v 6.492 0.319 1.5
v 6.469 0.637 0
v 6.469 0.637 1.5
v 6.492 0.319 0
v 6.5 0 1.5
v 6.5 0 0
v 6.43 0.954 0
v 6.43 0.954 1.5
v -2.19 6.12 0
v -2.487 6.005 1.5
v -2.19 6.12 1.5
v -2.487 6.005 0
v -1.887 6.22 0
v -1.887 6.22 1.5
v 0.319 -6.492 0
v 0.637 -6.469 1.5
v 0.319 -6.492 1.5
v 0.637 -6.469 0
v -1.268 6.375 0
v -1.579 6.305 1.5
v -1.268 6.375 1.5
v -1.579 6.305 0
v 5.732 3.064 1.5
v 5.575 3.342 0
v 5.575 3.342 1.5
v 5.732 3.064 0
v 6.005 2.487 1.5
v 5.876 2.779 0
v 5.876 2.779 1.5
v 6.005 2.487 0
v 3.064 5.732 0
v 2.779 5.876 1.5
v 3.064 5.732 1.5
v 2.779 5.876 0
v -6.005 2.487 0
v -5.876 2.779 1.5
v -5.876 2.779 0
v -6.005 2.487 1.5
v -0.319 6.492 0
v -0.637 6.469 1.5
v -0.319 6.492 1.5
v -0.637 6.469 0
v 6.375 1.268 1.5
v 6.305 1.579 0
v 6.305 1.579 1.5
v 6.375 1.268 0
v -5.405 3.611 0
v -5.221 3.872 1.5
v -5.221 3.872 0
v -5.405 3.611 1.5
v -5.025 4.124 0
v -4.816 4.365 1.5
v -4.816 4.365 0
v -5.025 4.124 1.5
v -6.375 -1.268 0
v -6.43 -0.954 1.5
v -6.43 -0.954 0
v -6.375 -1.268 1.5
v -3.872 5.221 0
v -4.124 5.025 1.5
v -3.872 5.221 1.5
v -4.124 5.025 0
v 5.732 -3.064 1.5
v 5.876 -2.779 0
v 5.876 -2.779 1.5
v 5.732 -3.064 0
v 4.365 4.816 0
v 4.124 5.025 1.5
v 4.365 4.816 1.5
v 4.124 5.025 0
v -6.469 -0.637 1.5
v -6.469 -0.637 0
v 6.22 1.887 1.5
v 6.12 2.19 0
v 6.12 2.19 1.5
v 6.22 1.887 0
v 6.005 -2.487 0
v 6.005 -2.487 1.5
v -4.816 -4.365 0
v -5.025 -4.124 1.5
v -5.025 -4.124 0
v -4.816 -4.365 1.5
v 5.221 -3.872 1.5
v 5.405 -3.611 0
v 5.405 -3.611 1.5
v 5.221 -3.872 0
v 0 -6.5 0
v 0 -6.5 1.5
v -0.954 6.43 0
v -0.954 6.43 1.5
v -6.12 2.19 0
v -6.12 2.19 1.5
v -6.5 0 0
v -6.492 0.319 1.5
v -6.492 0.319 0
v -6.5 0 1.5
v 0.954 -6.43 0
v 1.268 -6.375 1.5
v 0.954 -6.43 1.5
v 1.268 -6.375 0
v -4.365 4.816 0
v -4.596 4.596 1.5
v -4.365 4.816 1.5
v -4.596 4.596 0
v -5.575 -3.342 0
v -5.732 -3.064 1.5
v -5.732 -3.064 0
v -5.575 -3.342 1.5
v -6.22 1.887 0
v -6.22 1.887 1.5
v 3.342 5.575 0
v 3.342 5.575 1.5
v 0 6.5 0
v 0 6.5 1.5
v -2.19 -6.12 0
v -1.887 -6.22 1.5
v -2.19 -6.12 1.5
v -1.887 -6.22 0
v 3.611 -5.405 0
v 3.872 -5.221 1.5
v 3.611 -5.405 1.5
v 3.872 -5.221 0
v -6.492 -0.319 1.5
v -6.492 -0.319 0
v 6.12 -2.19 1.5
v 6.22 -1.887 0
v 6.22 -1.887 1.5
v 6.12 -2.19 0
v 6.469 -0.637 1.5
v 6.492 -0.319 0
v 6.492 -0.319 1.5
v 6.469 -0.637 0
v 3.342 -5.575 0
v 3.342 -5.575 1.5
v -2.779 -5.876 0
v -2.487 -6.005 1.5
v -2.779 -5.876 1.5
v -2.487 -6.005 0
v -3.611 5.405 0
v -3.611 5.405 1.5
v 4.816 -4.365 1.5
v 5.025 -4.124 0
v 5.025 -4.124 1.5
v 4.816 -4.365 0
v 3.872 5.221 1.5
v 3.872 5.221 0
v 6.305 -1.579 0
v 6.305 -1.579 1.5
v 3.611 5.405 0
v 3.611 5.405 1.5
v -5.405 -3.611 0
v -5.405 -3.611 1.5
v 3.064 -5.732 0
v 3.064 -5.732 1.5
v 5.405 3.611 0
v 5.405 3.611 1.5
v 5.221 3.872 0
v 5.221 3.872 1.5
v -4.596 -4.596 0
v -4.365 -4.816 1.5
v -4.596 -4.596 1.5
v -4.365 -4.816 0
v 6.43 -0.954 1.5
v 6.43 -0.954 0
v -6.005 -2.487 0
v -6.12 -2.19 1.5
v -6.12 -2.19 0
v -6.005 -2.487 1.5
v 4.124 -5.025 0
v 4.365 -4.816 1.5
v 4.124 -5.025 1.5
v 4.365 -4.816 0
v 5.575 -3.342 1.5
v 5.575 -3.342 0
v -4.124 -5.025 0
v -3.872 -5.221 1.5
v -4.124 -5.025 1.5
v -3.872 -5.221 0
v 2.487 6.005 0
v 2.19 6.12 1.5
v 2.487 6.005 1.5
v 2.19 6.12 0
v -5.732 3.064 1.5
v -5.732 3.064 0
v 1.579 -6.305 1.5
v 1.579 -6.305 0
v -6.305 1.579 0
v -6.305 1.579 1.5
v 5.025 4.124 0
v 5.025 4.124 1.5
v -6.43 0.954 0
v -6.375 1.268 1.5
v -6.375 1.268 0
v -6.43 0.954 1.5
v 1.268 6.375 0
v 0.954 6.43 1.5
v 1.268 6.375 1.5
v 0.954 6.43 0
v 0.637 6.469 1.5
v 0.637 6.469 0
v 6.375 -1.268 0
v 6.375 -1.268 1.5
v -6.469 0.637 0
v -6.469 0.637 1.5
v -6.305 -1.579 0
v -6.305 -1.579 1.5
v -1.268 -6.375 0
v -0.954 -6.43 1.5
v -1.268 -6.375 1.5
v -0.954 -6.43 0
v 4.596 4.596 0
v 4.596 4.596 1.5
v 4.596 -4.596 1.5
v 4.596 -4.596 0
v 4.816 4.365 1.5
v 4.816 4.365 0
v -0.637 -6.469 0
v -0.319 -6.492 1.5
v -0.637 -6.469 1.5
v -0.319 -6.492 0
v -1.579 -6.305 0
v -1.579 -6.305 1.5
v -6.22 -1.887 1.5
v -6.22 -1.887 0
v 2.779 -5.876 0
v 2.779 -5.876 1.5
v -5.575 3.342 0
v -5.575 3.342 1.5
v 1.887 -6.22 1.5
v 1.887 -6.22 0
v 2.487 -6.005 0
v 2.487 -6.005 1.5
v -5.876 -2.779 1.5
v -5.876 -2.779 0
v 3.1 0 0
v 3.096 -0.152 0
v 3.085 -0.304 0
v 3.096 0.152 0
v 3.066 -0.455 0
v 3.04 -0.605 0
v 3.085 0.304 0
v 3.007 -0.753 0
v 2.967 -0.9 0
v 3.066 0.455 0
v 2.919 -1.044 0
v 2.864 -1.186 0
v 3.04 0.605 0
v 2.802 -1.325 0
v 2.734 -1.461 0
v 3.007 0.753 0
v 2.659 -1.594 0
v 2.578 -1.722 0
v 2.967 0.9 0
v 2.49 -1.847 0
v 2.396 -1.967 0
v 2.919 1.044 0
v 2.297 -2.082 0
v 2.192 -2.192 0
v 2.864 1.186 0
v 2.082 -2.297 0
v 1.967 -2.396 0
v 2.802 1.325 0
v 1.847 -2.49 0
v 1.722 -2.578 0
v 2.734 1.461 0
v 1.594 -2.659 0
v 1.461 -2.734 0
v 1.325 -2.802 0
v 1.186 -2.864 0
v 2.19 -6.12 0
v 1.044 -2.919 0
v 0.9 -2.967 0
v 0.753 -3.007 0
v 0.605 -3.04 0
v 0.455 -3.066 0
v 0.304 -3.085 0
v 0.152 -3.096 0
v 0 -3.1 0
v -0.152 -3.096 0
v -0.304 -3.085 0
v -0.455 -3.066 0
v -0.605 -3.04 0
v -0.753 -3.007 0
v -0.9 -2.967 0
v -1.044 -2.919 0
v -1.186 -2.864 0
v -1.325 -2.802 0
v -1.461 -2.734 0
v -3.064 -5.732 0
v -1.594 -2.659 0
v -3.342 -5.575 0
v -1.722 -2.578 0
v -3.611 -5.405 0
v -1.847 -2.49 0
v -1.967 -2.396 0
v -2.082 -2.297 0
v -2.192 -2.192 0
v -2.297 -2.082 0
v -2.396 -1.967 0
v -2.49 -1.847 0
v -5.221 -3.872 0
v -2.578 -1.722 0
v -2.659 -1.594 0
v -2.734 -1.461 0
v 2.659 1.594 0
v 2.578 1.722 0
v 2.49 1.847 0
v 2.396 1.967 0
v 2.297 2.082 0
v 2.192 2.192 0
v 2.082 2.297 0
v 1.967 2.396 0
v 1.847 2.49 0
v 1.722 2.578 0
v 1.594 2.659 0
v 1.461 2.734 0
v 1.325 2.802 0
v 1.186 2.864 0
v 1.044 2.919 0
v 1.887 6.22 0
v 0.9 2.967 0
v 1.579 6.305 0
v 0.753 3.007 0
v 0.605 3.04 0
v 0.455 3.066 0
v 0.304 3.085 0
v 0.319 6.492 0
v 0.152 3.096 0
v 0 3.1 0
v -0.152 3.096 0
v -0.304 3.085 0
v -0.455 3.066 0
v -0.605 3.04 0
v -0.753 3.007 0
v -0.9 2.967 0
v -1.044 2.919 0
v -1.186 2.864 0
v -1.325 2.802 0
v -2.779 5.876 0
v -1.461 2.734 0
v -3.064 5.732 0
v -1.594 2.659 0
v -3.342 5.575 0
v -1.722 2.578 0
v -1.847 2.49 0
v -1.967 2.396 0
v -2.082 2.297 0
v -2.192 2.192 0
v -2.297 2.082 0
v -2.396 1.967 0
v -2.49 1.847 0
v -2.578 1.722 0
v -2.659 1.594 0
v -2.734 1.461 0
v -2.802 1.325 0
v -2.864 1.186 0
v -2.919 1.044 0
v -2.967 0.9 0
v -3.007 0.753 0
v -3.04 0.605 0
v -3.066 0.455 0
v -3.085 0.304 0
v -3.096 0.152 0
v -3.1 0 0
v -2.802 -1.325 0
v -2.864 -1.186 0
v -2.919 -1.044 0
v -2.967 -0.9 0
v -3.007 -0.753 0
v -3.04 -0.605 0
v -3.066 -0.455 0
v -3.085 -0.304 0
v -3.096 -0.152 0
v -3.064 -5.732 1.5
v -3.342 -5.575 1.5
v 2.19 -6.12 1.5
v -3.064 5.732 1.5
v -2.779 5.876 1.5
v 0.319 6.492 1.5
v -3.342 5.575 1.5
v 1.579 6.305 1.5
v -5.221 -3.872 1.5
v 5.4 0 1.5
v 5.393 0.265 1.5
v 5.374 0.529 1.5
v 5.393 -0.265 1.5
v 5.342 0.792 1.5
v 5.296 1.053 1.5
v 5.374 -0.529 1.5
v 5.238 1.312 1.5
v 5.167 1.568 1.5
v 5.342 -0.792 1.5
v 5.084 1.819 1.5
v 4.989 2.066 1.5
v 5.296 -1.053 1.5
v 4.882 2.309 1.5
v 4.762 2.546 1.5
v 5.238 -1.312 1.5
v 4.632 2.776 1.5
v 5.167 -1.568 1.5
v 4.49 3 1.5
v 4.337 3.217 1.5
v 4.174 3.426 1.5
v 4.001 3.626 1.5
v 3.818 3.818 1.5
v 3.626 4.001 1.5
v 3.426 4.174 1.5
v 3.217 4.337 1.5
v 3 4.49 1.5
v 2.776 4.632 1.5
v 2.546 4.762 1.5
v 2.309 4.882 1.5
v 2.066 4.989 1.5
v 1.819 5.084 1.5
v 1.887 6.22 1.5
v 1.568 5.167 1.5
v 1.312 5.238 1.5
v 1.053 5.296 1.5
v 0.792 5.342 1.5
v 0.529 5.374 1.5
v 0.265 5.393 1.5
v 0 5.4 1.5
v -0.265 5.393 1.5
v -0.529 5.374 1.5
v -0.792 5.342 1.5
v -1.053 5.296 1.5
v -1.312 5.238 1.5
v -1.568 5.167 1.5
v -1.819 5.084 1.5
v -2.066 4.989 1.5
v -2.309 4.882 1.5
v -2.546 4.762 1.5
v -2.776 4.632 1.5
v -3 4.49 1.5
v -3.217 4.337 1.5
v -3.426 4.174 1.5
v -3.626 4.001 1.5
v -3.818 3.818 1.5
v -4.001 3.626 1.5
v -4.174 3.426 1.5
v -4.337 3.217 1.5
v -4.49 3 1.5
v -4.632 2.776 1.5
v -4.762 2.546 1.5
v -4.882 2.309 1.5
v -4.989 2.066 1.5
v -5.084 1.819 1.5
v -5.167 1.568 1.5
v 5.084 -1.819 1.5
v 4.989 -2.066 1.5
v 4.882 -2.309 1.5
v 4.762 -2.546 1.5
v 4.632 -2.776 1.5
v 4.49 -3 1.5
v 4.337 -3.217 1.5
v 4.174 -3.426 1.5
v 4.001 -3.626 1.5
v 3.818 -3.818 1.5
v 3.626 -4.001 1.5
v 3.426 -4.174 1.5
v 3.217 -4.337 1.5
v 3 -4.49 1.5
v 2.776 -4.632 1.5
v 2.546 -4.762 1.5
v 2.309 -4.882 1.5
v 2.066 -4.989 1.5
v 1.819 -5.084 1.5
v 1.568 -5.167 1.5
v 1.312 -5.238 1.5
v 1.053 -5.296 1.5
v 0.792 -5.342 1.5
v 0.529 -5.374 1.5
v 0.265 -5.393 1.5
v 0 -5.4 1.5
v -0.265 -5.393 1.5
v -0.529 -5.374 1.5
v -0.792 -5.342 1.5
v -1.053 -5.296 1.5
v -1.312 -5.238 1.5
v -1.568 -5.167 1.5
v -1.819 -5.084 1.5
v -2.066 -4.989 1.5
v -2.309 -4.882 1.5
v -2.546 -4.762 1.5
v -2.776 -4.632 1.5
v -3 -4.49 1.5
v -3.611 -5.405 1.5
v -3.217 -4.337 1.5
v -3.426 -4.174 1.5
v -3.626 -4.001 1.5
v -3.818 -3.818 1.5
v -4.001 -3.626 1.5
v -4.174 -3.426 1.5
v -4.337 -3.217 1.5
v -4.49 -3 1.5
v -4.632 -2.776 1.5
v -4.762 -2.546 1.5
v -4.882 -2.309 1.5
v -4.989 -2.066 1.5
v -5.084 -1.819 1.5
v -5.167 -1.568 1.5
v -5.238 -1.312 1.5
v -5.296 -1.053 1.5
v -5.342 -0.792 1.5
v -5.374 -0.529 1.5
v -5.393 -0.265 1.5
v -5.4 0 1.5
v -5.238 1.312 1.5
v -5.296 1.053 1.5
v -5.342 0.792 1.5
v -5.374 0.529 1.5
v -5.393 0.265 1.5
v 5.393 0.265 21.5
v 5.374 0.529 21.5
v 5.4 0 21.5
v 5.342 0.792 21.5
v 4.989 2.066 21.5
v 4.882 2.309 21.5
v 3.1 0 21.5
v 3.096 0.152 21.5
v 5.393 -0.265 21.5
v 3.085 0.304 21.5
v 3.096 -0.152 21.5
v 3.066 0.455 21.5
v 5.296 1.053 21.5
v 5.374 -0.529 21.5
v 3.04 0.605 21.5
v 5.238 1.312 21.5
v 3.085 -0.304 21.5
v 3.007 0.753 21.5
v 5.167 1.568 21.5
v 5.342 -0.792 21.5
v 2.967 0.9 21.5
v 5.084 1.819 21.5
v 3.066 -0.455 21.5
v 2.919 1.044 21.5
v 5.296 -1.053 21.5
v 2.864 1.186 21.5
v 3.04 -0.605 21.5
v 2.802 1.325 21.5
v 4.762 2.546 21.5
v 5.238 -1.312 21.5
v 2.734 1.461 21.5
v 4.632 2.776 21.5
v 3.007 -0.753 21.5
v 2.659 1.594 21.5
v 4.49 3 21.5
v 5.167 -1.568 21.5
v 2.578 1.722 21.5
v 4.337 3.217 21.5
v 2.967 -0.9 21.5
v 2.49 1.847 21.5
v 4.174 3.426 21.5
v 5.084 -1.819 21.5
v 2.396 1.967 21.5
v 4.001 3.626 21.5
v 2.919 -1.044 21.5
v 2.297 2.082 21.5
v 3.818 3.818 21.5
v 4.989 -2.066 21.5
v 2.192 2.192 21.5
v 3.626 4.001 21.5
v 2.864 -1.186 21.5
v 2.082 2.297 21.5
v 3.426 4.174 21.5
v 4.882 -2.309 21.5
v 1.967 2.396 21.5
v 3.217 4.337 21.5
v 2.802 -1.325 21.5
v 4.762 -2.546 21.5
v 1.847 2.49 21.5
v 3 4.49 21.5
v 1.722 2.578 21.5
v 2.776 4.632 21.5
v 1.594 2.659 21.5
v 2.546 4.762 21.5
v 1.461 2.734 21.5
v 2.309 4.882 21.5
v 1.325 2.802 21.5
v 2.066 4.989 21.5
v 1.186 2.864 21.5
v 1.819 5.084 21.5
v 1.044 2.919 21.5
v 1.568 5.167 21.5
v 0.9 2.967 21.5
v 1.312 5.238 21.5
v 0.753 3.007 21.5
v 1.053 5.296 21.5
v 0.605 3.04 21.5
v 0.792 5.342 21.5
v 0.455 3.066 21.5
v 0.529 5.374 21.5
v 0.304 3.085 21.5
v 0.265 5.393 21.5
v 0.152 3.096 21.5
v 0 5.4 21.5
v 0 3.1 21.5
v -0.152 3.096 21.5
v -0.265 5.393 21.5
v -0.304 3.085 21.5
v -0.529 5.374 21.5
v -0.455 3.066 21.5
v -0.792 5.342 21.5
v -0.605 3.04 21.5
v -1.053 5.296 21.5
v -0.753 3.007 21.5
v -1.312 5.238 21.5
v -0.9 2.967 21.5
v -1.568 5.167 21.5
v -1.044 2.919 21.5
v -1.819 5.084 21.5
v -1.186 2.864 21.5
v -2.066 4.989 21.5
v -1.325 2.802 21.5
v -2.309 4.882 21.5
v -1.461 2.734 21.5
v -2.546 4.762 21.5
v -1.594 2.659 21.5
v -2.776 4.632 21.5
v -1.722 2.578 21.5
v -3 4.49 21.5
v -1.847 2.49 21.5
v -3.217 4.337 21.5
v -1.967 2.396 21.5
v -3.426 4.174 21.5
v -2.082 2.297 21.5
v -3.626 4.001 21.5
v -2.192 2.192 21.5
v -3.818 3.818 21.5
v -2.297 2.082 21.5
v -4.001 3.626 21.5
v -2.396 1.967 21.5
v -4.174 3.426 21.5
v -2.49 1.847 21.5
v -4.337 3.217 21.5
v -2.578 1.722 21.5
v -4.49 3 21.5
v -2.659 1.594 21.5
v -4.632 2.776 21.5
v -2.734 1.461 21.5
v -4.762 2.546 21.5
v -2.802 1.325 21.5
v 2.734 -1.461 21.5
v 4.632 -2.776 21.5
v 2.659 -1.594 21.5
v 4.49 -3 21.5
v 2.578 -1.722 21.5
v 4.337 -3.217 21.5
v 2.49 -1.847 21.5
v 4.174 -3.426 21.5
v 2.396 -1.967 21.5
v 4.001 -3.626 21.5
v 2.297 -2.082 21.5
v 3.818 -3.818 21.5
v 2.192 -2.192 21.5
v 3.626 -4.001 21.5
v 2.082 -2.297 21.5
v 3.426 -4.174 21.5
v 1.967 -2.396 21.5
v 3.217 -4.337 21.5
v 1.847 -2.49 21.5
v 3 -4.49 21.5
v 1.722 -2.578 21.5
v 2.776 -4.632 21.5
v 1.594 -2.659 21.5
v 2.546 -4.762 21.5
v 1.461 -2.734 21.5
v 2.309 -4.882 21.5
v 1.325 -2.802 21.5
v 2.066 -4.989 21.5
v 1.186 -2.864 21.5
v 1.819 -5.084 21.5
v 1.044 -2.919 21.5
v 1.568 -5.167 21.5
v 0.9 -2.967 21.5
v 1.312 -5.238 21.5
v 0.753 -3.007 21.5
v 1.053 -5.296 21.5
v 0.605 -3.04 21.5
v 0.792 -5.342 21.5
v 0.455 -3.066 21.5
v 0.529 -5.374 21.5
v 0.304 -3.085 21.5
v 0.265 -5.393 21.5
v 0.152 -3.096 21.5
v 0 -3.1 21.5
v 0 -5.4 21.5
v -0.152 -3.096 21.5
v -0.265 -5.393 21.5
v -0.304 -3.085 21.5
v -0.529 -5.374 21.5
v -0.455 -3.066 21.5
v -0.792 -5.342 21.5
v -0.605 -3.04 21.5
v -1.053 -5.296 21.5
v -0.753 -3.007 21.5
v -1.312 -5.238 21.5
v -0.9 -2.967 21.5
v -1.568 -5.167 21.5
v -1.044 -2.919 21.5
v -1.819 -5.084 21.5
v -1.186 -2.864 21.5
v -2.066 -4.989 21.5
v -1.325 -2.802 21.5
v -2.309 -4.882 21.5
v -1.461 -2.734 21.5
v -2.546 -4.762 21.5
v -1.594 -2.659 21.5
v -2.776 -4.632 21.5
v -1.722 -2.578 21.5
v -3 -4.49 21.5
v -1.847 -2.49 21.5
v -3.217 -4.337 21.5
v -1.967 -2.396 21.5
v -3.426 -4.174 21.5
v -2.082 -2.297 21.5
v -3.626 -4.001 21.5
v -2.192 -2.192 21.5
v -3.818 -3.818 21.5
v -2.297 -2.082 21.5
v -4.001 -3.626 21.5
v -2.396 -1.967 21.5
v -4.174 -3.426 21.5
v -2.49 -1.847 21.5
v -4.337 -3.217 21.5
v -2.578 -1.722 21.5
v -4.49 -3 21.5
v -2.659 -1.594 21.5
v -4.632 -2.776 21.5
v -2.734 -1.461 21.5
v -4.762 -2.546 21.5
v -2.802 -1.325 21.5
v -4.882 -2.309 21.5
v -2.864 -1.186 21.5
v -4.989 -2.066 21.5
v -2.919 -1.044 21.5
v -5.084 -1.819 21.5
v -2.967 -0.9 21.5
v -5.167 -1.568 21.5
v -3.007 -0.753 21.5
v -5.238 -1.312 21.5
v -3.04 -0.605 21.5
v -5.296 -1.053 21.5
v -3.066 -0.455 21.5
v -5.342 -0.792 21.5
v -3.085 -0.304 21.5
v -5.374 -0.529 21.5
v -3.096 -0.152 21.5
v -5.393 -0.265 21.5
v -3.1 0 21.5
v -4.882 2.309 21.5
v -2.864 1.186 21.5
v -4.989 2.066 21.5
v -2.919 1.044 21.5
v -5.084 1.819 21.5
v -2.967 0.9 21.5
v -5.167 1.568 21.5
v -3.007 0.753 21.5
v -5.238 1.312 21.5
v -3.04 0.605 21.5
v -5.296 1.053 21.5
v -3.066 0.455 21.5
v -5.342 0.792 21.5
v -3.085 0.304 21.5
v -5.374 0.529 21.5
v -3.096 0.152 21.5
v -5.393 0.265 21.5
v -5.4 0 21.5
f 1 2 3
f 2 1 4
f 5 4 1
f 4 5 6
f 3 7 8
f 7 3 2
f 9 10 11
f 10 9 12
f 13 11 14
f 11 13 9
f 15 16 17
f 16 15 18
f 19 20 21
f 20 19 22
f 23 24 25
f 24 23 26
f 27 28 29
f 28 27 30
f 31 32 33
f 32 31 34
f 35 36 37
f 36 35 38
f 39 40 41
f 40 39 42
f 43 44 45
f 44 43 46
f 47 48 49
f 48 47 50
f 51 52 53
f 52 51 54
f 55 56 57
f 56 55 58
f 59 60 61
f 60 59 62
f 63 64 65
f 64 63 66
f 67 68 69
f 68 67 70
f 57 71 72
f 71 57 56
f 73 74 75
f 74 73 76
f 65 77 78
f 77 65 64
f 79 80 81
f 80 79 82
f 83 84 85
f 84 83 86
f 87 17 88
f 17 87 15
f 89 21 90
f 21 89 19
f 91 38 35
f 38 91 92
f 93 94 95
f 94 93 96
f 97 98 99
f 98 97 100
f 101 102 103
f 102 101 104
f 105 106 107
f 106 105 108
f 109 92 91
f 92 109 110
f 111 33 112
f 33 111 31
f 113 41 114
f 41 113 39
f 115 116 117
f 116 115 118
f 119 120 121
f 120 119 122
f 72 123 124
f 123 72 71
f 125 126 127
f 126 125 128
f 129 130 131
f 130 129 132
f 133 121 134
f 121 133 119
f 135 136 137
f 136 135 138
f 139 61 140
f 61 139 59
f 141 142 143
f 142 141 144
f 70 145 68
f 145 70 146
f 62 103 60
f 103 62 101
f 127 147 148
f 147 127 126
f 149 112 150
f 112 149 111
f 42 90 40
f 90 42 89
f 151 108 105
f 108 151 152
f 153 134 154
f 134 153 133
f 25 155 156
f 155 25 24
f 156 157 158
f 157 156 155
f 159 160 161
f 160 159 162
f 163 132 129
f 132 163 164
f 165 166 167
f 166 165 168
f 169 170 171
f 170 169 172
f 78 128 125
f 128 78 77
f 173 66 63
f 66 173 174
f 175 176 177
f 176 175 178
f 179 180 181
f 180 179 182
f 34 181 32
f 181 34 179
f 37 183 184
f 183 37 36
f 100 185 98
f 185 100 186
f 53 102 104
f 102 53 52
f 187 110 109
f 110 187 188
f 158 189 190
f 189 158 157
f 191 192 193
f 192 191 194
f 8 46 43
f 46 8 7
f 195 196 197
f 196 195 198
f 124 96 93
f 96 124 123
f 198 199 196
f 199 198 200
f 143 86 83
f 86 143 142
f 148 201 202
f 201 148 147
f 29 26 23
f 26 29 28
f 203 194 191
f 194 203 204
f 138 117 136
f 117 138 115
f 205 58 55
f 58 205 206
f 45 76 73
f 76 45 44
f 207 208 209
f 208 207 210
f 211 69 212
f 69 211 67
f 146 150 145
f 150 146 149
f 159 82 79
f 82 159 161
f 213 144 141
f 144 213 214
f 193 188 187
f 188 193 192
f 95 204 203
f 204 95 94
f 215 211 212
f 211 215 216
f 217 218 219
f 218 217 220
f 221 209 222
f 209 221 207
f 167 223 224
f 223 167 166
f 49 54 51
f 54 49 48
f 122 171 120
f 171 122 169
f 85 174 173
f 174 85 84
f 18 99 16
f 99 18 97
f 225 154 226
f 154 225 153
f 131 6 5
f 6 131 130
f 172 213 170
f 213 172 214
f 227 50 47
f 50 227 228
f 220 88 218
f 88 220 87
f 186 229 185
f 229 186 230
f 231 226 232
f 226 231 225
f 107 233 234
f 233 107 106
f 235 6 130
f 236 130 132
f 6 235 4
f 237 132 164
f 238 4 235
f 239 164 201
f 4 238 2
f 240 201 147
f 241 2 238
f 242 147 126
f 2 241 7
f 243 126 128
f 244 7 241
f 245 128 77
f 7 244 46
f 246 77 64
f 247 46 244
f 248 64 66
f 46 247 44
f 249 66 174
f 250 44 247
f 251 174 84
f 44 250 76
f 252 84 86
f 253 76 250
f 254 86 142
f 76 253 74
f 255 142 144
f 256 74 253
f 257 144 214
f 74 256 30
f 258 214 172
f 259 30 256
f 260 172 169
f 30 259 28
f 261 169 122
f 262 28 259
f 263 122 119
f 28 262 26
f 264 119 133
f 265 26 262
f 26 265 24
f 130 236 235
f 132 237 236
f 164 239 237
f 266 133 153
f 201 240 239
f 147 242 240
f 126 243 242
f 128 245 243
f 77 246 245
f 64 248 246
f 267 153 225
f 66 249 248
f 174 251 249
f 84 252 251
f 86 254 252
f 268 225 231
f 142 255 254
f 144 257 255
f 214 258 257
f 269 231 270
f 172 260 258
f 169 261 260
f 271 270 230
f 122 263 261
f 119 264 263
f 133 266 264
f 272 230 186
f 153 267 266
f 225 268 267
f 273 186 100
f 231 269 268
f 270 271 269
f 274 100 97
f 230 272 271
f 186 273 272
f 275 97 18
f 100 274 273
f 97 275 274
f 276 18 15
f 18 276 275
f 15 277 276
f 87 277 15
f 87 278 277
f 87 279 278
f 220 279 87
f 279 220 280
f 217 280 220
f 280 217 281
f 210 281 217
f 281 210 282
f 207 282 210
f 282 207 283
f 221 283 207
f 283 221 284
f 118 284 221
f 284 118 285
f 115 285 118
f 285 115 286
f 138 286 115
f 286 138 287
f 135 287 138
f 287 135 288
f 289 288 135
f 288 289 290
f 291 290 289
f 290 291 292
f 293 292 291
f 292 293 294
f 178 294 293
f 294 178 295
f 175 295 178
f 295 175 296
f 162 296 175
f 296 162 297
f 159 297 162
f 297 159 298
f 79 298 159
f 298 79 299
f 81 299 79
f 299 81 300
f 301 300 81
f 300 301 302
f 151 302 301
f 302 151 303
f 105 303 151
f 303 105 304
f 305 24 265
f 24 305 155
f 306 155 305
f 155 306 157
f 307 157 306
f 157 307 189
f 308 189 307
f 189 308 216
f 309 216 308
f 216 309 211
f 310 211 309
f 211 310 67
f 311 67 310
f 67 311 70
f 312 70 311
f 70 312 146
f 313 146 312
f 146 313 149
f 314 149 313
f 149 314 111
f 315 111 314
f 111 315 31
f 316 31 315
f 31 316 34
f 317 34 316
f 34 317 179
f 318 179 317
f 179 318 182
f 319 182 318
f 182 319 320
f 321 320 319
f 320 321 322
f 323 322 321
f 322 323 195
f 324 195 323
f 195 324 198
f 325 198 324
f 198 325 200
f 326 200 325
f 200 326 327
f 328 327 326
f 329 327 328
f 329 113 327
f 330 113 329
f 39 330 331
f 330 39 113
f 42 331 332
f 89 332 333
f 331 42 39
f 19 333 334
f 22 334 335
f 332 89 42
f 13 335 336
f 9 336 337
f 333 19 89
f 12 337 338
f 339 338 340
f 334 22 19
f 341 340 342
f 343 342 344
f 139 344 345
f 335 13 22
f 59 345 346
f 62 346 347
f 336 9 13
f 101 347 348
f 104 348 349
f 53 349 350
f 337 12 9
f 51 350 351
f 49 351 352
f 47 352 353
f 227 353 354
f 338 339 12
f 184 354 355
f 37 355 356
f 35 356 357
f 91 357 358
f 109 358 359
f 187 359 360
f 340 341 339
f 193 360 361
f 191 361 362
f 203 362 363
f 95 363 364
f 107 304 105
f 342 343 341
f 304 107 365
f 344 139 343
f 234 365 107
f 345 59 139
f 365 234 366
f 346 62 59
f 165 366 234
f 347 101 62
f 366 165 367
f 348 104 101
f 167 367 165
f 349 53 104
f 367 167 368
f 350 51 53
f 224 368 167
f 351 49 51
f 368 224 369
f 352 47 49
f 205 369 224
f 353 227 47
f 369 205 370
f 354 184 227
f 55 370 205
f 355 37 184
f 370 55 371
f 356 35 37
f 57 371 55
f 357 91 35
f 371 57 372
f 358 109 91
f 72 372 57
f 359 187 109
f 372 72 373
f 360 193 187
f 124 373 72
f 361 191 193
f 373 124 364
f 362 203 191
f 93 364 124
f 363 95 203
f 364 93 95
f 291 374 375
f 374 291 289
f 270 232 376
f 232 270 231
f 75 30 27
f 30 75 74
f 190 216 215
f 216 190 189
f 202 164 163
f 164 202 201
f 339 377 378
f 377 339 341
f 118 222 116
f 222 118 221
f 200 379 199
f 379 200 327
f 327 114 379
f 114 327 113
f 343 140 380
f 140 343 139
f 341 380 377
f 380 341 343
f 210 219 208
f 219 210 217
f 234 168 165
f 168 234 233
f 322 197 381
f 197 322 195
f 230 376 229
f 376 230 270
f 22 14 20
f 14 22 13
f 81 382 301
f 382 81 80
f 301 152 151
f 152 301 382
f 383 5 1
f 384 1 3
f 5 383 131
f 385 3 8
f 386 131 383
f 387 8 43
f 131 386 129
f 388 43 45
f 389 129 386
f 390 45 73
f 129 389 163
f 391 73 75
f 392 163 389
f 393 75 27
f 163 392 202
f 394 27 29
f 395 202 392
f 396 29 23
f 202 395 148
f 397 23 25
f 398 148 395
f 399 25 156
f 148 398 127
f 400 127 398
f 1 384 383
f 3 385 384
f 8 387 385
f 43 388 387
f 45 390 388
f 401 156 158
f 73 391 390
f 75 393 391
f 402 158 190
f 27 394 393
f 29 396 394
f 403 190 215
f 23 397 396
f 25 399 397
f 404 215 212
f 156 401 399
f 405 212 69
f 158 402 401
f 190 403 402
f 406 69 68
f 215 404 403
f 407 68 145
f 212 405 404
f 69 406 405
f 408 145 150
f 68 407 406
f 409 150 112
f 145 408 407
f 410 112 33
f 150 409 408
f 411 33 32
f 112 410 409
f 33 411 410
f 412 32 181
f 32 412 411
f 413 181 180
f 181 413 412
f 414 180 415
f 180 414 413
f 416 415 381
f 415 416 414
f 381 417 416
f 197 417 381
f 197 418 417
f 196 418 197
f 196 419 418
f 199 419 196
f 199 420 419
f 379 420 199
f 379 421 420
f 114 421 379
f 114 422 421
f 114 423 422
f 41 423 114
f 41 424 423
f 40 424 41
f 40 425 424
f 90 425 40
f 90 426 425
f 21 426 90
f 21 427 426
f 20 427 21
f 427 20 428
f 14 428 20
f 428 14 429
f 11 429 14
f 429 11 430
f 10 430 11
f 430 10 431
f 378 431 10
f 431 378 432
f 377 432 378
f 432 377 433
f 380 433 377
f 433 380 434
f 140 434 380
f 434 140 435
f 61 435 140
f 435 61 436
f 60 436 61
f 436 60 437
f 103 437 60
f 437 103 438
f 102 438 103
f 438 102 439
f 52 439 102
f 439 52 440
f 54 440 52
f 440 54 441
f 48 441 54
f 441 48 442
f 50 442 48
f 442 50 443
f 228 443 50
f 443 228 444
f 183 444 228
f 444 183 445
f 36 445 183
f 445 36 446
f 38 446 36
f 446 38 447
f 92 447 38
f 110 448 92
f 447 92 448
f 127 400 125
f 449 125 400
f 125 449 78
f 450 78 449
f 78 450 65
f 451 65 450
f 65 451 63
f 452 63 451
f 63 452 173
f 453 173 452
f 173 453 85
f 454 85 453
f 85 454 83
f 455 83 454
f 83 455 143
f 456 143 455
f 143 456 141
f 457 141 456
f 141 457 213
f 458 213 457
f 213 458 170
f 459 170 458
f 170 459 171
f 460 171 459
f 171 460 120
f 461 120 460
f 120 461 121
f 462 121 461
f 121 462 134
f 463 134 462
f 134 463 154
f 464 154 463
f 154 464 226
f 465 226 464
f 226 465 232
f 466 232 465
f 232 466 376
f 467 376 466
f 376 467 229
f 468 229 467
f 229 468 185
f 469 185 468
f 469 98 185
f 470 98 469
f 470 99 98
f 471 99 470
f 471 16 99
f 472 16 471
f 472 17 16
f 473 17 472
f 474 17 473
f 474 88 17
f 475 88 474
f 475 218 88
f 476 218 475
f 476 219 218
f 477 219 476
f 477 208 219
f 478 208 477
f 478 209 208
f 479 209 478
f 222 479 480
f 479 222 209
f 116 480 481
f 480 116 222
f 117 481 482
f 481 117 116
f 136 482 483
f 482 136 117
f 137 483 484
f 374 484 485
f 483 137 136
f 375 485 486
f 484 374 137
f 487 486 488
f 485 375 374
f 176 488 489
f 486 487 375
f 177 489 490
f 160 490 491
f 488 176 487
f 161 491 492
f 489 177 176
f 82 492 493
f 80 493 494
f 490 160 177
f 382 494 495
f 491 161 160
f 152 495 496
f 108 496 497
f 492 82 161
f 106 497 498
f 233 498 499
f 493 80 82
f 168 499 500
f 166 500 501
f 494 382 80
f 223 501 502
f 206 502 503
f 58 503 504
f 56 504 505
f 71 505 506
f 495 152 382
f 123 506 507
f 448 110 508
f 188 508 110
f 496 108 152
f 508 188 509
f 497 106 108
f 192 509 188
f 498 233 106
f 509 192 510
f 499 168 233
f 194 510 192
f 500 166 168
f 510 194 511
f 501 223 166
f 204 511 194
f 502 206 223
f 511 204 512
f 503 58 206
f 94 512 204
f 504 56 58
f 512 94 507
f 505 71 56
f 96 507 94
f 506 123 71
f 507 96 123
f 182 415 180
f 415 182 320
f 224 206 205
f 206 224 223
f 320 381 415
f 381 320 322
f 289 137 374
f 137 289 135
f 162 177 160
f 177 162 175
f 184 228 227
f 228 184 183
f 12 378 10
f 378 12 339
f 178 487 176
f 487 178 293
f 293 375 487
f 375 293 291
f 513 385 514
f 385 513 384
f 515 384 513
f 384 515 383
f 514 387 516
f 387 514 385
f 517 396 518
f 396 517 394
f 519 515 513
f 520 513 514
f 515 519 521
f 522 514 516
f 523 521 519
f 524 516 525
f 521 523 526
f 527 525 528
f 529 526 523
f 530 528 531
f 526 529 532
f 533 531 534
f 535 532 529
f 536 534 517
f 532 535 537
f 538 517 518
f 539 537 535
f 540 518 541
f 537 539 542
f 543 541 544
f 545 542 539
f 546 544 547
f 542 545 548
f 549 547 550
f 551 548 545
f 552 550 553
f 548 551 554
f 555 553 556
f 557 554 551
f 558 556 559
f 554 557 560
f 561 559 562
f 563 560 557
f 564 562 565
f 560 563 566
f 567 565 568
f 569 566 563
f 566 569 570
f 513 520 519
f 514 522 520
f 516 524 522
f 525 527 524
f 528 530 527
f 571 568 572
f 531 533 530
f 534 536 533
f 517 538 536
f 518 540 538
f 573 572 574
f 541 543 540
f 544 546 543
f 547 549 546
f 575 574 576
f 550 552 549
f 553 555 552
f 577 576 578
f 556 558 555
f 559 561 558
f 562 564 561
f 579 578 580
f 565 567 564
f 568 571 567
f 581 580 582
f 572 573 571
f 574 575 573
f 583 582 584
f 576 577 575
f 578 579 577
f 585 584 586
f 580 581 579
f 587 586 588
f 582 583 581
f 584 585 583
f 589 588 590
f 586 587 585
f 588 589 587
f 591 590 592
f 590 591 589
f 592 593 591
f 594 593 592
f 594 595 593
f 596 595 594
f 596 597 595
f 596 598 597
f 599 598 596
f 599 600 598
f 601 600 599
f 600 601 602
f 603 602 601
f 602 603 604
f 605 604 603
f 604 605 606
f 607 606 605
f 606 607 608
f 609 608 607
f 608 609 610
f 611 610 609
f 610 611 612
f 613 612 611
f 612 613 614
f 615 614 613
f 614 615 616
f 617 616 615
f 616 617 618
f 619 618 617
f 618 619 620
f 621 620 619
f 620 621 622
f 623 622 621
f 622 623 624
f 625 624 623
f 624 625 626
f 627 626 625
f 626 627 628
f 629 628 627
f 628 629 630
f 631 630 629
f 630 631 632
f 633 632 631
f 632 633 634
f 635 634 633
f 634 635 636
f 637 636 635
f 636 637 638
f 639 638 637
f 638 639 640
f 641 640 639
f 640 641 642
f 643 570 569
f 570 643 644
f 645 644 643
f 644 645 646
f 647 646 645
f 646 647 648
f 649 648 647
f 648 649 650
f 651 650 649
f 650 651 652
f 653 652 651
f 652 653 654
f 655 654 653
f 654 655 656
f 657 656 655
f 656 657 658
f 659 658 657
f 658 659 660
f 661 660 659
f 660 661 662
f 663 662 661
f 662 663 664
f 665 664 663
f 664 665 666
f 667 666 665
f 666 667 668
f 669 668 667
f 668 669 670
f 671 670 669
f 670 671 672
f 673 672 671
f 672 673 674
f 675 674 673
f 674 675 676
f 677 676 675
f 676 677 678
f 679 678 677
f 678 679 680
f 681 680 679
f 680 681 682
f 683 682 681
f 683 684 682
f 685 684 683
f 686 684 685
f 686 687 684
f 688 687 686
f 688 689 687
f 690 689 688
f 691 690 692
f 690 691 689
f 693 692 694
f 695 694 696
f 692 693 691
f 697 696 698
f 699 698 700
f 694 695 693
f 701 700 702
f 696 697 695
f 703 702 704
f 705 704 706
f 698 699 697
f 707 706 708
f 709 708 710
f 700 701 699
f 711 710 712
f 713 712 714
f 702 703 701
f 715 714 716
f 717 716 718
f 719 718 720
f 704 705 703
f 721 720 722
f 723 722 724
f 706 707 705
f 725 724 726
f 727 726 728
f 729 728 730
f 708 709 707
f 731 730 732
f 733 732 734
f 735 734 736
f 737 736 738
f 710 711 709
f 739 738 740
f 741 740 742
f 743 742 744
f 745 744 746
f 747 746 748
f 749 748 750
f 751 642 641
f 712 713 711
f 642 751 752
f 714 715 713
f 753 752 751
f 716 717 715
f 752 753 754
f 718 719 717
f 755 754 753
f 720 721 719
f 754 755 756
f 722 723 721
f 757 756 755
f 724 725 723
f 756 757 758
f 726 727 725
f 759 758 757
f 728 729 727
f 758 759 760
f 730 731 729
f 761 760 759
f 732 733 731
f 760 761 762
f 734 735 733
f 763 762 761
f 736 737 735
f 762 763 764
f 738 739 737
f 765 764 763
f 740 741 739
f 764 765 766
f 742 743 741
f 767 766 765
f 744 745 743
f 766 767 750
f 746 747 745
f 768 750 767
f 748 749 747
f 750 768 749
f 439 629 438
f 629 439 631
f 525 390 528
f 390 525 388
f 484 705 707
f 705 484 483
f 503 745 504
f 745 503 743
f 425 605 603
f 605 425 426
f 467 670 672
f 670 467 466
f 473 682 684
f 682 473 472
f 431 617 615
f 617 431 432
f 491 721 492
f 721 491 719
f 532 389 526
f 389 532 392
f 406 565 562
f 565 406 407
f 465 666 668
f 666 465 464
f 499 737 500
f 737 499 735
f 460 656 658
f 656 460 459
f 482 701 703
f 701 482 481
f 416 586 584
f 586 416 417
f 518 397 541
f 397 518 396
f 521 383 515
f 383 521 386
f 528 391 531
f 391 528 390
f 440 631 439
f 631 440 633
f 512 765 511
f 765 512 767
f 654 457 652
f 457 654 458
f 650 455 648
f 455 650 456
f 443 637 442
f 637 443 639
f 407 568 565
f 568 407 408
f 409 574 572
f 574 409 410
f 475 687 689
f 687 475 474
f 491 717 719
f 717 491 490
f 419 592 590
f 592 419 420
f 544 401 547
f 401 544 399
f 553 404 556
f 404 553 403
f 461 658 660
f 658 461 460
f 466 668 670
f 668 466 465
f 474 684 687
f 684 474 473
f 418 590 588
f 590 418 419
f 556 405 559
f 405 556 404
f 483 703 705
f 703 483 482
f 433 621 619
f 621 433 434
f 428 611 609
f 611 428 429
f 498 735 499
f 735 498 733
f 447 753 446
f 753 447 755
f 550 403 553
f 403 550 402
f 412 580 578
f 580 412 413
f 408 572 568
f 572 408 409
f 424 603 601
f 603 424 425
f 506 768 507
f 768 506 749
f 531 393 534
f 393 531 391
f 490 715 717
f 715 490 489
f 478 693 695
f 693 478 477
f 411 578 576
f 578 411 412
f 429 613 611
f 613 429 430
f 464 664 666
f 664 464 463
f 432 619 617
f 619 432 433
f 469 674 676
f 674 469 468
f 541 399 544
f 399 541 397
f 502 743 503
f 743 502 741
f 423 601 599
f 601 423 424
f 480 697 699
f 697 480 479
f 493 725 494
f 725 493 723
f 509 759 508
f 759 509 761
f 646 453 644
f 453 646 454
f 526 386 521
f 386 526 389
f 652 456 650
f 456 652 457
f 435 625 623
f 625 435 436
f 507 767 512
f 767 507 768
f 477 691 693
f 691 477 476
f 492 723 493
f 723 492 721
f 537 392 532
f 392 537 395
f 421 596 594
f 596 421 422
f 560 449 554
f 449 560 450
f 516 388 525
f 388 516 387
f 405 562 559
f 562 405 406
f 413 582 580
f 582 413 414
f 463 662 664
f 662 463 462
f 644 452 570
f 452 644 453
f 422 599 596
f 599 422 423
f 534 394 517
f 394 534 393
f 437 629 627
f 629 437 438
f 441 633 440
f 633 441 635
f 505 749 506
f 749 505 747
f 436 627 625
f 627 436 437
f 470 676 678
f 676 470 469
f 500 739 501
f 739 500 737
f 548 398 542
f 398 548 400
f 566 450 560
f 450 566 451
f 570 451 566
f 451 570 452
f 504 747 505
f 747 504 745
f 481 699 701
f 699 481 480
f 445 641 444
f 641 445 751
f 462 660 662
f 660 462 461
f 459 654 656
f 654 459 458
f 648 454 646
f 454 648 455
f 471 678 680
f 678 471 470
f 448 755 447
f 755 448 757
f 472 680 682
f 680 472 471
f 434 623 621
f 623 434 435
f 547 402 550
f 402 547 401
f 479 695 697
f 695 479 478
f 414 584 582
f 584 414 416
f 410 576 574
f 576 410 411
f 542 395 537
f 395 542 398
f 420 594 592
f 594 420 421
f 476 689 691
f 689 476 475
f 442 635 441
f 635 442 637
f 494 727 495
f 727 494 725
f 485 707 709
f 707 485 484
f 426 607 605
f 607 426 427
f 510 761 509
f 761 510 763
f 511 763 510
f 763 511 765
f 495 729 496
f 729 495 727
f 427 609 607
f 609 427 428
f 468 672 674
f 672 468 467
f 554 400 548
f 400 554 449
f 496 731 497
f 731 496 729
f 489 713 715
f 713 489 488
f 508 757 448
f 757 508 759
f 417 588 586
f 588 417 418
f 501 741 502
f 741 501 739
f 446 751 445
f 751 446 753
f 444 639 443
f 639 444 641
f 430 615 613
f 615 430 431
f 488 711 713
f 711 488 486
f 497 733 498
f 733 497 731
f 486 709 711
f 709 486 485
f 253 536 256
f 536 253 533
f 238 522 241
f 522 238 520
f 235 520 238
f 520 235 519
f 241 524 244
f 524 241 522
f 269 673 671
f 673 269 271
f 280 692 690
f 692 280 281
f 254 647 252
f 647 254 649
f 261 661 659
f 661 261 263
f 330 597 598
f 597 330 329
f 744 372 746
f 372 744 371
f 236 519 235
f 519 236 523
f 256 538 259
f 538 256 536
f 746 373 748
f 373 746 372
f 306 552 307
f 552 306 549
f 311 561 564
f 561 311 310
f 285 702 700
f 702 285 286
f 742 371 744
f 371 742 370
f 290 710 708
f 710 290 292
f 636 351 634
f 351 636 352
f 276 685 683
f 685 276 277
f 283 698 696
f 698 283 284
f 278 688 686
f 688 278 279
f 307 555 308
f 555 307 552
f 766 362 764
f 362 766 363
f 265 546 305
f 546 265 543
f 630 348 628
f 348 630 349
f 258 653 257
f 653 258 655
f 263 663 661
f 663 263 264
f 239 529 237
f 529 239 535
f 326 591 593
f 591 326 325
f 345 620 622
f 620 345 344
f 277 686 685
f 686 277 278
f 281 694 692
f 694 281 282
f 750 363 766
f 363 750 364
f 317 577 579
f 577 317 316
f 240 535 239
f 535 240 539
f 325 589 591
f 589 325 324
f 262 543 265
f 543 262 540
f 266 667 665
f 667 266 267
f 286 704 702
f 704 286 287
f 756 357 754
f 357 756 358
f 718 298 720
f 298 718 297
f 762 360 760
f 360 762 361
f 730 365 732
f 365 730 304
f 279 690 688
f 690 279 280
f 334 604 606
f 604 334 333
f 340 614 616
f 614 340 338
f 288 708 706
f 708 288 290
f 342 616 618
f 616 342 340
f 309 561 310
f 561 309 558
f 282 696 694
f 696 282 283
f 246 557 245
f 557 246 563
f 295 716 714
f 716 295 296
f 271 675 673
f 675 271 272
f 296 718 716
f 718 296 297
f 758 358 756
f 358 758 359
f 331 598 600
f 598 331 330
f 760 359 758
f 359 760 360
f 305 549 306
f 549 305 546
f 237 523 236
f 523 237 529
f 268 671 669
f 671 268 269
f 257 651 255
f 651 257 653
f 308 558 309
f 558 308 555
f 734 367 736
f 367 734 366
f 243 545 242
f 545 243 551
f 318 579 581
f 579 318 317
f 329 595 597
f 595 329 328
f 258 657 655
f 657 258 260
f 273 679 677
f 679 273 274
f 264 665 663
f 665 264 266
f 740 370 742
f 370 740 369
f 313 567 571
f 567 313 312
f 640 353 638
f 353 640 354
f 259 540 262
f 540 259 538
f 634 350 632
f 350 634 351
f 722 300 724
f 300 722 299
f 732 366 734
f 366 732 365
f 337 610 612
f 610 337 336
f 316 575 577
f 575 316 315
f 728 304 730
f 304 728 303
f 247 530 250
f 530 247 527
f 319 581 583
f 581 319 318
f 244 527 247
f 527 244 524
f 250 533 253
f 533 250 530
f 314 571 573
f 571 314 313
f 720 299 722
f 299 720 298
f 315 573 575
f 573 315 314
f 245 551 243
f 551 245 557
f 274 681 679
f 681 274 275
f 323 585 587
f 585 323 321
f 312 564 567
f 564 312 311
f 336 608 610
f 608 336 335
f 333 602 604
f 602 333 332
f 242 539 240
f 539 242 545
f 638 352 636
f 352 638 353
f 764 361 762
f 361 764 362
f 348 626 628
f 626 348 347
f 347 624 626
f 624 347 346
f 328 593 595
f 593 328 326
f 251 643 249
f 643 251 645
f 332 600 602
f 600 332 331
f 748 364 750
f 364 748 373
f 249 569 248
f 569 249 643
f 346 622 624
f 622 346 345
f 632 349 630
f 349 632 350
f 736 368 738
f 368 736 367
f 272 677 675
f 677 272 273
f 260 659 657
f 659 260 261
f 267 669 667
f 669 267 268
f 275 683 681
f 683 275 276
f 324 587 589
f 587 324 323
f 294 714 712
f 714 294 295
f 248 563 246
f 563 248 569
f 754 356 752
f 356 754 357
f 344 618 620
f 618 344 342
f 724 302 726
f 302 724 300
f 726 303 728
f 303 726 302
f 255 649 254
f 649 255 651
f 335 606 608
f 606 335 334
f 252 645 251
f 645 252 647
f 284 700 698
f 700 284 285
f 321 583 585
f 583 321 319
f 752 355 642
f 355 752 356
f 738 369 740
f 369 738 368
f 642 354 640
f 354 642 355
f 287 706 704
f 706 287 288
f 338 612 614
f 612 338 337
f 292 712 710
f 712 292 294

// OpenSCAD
// Adapter Sleeve for 0.2mL PCR Tube in 1.5mL Rack
// Print Orientation: Upside down (Collar on bed)
// Units: mm

// --- Dimensions ---
$fn = 128; // High resolution for smooth curves and accurate holes

// Collar (Base)
$collar_outer_diameter = 13.0;
$collar_thickness = 1.5;

// Sleeve Body
$sleeve_outer_diameter = 10.8;
$sleeve_total_height = 21.5;
$sleeve_inner_diameter = 6.2;

// --- Calculated Variables ---
$collar_radius = $collar_outer_diameter / 2;
$sleeve_outer_radius = $sleeve_outer_diameter / 2;
$sleeve_inner_radius = $sleeve_inner_diameter / 2;
$sleeve_body_height = $sleeve_total_height - $collar_thickness;

// --- Main Part ---
difference() {
    // 1. Create the outer solid shape
    union() {
        // Collar (Disk)
        cylinder(
            h = $collar_thickness,
            r = $collar_radius,
            center = [0, 0, 0]
        );
        
        // Sleeve Body (Cylinder rising from top of collar)
        translate([0, 0, $collar_thickness]) {
            cylinder(
                h = $sleeve_body_height,
                r = $sleeve_outer_radius,
                center = [0, 0, $collar_thickness]
            );
        }
    }
    
    // 2. Cut the central bore through the full height
    // The bore must extend slightly past the top and bottom faces to ensure clean cuts
    translate([0, 0, -0.1]) {
        cylinder(
            h = $sleeve_total_height + 0.2,
            r = $sleeve_inner_radius,
            center = [0, 0, 0]
        );
    }
}
